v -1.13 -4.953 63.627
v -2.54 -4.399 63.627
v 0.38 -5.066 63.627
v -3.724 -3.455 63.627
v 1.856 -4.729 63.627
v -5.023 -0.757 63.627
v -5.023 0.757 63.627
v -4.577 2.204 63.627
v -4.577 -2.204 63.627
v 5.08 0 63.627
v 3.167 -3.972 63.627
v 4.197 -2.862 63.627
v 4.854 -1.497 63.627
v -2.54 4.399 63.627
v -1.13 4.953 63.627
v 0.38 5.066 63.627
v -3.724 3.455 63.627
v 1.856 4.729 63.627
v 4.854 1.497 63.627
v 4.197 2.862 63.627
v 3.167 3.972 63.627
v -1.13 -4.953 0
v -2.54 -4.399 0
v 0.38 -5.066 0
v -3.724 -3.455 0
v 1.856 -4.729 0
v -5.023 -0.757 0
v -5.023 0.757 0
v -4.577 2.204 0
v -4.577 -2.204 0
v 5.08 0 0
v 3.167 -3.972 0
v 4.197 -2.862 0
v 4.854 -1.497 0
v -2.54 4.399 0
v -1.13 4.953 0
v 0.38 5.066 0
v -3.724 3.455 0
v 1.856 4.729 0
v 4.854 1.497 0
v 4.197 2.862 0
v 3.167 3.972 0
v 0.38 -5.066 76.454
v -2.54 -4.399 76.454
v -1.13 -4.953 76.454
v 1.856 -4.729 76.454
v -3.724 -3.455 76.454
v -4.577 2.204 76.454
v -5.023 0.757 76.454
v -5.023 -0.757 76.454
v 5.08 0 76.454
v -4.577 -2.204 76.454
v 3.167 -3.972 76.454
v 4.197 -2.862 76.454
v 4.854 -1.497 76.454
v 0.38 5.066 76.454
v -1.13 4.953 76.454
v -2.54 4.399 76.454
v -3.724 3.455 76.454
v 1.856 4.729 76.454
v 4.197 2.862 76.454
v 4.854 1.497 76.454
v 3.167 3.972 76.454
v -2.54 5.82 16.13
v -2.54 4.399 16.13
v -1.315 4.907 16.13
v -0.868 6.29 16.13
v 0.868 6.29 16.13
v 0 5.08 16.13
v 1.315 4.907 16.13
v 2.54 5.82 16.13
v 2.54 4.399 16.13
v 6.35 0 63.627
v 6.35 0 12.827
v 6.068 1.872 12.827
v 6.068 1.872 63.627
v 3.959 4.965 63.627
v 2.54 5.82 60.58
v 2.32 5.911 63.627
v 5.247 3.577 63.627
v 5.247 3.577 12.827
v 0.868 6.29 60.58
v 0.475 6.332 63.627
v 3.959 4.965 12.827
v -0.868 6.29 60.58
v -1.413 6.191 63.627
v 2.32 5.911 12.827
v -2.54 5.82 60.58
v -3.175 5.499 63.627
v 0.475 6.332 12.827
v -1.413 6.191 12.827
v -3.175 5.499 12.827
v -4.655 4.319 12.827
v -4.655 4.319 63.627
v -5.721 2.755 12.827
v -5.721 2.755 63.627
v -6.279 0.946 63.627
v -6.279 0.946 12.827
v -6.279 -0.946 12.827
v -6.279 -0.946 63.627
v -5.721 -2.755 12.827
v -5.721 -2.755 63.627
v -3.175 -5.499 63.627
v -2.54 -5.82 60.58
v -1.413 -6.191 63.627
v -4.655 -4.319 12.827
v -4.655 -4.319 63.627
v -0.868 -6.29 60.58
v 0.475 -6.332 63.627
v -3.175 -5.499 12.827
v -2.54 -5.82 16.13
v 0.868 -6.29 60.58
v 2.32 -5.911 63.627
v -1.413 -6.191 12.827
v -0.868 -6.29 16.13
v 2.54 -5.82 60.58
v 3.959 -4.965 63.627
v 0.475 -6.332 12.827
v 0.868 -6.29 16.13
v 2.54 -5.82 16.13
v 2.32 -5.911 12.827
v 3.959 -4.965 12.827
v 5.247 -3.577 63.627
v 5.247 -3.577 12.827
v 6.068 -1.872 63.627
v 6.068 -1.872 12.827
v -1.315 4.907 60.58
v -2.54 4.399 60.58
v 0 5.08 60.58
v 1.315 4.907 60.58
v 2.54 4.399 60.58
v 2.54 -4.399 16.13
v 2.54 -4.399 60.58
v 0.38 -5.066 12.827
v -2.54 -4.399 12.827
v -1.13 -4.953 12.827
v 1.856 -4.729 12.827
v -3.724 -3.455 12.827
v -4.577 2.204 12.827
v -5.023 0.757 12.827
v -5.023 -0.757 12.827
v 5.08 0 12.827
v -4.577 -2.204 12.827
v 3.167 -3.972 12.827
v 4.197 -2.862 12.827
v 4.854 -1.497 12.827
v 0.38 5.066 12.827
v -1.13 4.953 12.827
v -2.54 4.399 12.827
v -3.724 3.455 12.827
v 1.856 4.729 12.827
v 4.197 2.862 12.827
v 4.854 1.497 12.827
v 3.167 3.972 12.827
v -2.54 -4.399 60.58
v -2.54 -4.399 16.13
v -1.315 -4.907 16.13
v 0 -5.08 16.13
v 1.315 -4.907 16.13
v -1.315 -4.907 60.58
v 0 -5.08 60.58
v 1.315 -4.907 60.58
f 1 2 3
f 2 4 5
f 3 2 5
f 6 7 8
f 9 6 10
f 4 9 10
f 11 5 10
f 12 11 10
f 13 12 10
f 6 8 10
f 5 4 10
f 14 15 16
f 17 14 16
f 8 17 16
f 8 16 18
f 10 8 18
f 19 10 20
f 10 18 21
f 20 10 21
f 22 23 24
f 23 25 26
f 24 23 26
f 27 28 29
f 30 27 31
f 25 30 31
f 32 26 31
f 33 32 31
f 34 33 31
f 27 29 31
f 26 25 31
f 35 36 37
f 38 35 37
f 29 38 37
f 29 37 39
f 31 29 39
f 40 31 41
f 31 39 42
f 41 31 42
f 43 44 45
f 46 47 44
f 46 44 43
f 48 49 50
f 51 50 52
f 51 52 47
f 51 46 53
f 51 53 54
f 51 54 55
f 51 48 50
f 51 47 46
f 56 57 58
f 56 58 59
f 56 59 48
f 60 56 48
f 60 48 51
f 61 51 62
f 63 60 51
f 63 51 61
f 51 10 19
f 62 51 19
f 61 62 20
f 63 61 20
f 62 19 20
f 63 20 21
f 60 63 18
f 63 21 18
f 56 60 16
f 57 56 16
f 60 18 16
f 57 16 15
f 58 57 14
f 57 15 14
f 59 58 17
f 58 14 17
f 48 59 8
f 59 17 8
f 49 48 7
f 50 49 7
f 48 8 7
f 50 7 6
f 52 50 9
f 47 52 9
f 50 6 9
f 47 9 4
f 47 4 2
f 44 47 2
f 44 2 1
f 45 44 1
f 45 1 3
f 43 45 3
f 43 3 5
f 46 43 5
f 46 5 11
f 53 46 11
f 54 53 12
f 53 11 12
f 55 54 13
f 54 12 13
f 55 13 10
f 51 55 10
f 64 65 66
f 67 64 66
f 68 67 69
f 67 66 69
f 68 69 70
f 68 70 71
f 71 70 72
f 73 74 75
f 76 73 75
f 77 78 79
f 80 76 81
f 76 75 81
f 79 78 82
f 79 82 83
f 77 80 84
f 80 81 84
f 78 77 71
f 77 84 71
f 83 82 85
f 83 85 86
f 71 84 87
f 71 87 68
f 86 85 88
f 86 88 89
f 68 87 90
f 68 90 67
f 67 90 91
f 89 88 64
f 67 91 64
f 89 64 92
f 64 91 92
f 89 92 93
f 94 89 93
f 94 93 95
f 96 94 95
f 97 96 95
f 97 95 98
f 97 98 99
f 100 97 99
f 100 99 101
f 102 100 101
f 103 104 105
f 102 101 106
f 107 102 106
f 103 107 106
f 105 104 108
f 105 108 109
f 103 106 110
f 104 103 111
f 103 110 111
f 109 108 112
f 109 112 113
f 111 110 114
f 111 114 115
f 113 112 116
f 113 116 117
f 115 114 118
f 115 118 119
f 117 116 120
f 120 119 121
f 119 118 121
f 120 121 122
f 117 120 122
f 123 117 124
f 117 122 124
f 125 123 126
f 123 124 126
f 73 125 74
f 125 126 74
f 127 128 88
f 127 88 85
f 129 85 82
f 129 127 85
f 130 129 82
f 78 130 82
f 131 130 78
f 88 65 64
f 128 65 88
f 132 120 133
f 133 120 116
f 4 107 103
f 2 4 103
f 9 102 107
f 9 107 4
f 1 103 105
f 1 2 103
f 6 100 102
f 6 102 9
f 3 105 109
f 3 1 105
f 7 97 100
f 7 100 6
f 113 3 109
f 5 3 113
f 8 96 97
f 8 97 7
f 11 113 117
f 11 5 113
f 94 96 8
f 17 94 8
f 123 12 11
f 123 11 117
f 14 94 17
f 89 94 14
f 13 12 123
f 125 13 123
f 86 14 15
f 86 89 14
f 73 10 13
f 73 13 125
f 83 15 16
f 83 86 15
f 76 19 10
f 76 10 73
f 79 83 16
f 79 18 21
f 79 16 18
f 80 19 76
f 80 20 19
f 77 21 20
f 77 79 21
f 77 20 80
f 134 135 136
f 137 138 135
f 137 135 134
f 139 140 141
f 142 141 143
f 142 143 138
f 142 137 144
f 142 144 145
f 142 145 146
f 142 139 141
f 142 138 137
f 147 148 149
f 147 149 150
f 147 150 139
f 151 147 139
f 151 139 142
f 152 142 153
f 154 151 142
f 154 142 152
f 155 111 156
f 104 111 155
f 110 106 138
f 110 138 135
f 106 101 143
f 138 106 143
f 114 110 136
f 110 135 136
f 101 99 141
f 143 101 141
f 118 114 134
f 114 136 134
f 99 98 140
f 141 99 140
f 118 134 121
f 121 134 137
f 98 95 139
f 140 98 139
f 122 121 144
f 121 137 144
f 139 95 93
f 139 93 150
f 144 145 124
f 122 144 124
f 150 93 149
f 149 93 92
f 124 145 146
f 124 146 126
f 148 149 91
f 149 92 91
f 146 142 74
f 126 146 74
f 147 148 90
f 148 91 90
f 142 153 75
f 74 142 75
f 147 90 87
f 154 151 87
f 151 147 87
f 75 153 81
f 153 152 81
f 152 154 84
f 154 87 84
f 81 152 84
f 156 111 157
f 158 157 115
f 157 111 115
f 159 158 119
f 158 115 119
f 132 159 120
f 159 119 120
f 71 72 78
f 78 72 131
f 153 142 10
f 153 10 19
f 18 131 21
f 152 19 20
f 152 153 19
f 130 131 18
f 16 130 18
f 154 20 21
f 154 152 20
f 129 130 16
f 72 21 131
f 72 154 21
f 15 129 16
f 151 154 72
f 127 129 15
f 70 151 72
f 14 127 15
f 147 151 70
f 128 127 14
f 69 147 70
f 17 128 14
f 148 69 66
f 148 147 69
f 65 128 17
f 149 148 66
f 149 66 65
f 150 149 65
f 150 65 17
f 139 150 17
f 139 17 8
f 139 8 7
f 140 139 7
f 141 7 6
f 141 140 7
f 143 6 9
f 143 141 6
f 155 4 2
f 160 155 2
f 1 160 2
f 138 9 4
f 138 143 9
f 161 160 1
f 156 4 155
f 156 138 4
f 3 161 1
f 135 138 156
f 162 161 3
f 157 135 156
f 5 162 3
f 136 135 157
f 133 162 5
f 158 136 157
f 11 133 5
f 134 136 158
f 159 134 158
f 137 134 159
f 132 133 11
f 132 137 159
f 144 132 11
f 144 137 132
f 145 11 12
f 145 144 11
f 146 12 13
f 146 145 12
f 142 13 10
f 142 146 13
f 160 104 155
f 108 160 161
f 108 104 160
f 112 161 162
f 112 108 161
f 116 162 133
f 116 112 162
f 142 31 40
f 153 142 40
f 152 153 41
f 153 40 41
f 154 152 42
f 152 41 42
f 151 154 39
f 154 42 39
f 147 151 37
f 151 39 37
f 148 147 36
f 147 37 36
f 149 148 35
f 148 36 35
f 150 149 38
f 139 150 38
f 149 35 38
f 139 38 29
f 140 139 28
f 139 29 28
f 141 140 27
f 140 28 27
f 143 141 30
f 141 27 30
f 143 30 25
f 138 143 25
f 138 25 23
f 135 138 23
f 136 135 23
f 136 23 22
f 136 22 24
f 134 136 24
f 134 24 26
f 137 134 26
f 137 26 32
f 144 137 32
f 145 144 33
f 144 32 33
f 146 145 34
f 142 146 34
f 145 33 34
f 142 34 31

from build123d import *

# Parameters (mm, degrees)
F0_R     = 5.08
F1_DEPTH = 12.827
F2_R     = 6.35
F2_R_2   = 5.08
F3_DEPTH = 50.8
F4_R     = 5.08
F5_DEPTH = 12.827
F7_W     = 5.08
F7_H     = 44.45
F8_DEPTH = 25.4


with BuildPart() as f1:
    # F0 (on Top) → F1 (new body)
    with BuildSketch(Plane.XY):
        Circle(F0_R)
    extrude(amount=F1_DEPTH)


with BuildPart() as f3:
    # F2 (on face) → F3 (new body)
    with BuildSketch(Plane.XY.offset(12.827)):
        Circle(F2_R)
        Circle(F2_R_2, mode=Mode.SUBTRACT)
    extrude(amount=F3_DEPTH)

    # F7 (on offset) → F8 (cut)
    with BuildSketch(Plane.XZ.offset(6.35)):
        with Locations((0, 38.354978)):
            Rectangle(F7_W, F7_H)
    extrude(amount=-F8_DEPTH, mode=Mode.SUBTRACT)


with BuildPart() as f5:
    # F4 (on face) → F5 (new body)
    with BuildSketch(Plane.XY.offset(63.627)):
        Circle(F4_R)
    extrude(amount=F5_DEPTH)


solid = Compound([f1.part, f3.part, f5.part])
